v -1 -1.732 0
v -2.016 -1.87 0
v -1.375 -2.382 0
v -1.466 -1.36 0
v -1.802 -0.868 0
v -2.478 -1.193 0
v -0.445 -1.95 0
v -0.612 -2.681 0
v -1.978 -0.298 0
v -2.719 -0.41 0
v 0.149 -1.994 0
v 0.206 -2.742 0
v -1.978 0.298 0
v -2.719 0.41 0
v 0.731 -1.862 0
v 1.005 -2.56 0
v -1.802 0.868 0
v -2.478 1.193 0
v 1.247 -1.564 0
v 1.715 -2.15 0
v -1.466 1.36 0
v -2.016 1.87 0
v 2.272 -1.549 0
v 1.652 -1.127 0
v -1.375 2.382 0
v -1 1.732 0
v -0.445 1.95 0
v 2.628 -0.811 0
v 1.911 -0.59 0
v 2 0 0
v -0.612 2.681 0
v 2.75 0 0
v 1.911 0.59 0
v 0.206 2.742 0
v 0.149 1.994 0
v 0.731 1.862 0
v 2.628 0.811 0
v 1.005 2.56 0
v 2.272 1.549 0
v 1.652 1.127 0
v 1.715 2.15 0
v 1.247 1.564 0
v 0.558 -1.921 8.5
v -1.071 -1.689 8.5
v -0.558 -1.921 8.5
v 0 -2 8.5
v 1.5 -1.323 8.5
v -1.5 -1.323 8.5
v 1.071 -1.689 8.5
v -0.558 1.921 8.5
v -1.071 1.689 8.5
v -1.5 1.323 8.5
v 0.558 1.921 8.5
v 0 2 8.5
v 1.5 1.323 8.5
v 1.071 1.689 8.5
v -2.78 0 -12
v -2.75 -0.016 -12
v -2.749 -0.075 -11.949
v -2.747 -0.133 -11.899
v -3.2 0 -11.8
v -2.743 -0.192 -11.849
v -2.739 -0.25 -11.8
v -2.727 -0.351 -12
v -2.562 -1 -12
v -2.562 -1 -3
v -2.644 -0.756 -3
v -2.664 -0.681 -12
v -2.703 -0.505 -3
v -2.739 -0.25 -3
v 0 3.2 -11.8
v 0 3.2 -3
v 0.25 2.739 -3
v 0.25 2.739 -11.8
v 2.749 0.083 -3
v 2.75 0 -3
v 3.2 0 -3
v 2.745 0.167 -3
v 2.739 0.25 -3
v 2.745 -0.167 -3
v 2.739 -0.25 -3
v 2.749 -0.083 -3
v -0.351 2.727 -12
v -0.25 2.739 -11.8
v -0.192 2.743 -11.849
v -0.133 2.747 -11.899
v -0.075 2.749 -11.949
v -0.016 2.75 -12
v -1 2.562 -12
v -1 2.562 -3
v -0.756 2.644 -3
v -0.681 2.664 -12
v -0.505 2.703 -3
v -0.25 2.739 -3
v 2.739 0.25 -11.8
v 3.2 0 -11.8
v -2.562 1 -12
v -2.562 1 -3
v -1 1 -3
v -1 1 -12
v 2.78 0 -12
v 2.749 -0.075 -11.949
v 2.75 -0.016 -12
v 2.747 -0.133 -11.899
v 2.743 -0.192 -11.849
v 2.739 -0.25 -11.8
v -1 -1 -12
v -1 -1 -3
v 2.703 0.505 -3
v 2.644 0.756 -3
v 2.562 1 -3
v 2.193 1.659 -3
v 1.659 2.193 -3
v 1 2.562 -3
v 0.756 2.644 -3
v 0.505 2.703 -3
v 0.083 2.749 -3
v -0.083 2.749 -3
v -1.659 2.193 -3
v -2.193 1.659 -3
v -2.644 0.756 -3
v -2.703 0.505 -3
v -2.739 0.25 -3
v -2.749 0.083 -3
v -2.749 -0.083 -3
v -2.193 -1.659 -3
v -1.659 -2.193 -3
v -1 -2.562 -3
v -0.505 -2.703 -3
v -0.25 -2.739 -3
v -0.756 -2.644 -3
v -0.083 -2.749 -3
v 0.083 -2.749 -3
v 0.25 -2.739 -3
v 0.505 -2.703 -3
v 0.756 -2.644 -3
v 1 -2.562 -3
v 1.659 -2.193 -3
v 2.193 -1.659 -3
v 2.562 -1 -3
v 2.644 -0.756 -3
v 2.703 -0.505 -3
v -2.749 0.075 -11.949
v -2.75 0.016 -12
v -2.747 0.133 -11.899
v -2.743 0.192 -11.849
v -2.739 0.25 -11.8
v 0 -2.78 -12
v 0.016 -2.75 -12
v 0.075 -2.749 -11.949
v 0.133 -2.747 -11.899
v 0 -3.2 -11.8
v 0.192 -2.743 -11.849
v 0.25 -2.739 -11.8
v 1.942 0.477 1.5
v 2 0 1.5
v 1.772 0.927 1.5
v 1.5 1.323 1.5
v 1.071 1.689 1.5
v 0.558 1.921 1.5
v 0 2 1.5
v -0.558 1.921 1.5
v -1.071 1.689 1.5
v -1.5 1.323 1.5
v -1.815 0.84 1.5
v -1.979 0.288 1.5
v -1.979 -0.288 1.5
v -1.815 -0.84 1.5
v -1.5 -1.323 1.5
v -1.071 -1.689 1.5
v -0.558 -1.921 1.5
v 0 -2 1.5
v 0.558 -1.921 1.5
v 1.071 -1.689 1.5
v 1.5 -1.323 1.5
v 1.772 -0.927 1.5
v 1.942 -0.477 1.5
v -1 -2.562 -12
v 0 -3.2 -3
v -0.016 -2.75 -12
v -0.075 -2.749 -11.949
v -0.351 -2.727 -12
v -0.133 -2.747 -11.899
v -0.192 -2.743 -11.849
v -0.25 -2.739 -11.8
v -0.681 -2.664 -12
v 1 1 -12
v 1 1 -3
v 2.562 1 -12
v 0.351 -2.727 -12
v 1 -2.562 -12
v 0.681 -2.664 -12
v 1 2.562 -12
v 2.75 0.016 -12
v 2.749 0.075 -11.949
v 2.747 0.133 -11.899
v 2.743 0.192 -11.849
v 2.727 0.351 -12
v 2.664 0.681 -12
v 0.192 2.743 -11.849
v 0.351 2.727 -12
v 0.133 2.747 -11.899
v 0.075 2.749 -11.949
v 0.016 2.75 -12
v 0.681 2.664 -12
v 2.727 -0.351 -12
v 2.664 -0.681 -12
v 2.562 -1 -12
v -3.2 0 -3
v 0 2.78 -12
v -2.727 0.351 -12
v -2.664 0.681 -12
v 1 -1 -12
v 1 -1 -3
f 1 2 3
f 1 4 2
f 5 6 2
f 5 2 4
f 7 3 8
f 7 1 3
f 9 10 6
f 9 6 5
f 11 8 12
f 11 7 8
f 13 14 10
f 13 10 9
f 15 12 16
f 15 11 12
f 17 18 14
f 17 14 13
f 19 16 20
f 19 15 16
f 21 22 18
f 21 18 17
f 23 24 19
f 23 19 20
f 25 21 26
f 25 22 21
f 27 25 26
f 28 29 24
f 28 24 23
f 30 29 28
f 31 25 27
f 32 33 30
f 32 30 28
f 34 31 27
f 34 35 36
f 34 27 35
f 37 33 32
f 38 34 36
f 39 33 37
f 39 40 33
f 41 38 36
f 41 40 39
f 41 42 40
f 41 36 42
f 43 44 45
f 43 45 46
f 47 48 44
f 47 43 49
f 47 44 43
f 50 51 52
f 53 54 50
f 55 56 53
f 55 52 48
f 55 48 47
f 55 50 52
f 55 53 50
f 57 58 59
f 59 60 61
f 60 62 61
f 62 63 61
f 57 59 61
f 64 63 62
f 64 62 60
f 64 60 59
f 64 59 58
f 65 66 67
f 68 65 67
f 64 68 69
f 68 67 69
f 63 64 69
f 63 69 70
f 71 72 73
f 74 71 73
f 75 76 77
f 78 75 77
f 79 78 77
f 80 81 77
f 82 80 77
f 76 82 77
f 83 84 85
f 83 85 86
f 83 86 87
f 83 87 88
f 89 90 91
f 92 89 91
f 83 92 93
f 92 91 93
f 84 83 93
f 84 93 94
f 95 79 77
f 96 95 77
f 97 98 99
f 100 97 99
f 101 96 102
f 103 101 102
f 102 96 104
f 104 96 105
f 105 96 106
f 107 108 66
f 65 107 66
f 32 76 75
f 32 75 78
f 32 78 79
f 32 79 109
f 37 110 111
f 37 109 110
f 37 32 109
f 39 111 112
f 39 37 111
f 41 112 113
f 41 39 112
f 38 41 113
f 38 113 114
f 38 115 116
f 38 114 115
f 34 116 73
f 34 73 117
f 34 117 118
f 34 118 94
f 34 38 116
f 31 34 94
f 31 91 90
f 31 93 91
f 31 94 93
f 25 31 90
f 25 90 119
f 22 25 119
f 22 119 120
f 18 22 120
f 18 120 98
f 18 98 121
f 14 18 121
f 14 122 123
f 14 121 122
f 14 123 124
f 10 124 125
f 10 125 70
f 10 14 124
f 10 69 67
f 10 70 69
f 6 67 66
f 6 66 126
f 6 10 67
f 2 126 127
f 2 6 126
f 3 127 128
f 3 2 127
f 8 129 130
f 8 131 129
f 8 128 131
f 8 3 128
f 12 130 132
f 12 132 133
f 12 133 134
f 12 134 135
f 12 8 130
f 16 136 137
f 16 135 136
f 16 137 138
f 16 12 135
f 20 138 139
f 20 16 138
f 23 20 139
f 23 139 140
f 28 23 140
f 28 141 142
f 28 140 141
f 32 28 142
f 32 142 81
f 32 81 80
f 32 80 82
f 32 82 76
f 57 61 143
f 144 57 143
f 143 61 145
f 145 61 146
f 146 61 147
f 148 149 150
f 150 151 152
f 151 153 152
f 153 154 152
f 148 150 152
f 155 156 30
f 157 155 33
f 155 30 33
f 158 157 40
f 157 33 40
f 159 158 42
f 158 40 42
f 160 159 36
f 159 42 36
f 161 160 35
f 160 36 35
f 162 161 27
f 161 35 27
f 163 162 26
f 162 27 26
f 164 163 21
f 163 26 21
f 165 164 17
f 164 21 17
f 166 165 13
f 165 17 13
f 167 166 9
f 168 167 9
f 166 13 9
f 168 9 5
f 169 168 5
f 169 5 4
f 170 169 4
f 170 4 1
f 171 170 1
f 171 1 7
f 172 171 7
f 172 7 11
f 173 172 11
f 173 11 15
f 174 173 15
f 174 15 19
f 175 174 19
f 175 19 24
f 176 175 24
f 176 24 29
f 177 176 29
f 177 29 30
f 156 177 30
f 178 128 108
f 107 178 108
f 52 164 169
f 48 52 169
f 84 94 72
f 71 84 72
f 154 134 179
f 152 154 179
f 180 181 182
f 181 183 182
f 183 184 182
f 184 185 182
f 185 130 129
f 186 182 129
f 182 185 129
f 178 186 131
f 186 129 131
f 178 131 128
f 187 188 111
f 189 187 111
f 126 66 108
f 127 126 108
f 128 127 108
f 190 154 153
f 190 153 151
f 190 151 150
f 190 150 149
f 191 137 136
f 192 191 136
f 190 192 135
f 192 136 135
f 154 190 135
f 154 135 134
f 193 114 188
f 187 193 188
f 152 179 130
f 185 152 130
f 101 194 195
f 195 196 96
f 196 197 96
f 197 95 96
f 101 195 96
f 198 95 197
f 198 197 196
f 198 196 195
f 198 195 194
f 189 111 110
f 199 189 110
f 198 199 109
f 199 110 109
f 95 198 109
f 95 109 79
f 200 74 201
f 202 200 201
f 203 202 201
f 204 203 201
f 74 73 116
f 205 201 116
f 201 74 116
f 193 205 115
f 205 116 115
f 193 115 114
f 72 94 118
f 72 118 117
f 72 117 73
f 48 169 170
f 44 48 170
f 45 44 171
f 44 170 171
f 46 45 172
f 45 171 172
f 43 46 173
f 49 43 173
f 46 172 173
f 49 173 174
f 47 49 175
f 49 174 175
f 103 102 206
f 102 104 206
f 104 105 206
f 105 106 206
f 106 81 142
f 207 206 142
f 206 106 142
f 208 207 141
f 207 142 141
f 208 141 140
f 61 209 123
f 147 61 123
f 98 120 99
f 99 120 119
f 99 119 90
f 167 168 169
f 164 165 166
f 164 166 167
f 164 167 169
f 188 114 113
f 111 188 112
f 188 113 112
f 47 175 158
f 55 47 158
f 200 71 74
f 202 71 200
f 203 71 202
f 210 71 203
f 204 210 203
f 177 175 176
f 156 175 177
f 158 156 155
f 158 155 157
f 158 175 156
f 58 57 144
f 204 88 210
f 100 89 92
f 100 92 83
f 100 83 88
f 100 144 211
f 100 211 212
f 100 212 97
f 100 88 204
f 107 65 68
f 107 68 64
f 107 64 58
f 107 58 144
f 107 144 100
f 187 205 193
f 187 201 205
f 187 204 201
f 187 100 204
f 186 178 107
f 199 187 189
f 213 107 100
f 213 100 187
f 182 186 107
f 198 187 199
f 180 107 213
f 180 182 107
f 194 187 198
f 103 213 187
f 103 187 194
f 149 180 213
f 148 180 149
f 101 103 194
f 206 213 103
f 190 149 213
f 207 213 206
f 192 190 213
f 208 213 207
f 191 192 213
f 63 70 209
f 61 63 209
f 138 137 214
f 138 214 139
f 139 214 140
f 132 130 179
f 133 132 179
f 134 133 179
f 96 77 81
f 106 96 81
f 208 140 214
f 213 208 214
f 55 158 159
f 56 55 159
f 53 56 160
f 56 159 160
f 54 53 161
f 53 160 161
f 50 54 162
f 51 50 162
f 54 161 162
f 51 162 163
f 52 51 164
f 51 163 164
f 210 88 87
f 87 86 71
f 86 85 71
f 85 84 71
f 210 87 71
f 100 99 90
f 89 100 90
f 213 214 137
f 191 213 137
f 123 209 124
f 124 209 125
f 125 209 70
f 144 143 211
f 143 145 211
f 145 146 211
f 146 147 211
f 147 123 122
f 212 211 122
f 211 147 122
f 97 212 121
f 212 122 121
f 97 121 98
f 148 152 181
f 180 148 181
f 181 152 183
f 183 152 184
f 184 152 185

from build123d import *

# Parameters (mm, degrees)
F0_R     = 2.75
F0_R_2   = 2
F1_DEPTH = 3
F2_DEPTH = 1.5
F4_DEPTH = 7
F6_DEPTH = 9
F7_SIZE  = 0.2


# Not quite as in the source:
# - after a boolean that leaves OpenCascade's solid faulty, fix() repairs it


with BuildPart() as f1:
    # F0 (on Top) → F1 (new body)
    with BuildSketch(Plane.XY):
        Circle(F0_R)
        Circle(F0_R_2, mode=Mode.SUBTRACT)
        Circle(F0_R_2)
    extrude(amount=-F1_DEPTH)

    # F0 (on Top) → F2 (join)
    with BuildSketch(Plane.XY):
        Circle(F0_R_2)
    extrude(amount=F2_DEPTH)

    # F3 (on face) → F4 (join)
    with BuildSketch(Plane.XY.offset(1.5)):
        with BuildLine():
            ThreePointArc((1.5, 1.3228756555), (0, 2), (-1.5, 1.3228756555))
            Line((-1.5, 1.3228756555), (-1.5, -1.3228756555))
            ThreePointArc((-1.5, -1.3228756555), (0, -2), (1.5, -1.3228756555))
            Line((1.5, -1.3228756555), (1.5, 1.3228756555))
        make_face()
    extrude(amount=F4_DEPTH)

    # F5 (on face) → F6 (join)
    with BuildSketch(Plane(origin=(0, 0, -3), x_dir=(1, 0, 0), z_dir=(0, 0, -1))):
        with BuildLine():
            ThreePointArc((0.25, -2.7386127875), (0.63122595, -2.676575013), (1, -2.5617376915))
            Line((1, -2.5617376915), (1, -1))
            Line((1, -1), (2.5617376915, -1))
            ThreePointArc((2.5617376915, -1), (2.676575013, -0.63122595), (2.7386127875, -0.25))
            ThreePointArc((2.7386127875, -0.25), (2.7471517218, -0.1251296014), (2.75, 0))
            ThreePointArc((2.75, 0), (2.7471517218, 0.1251296014), (2.7386127875, 0.25))
            ThreePointArc((2.7386127875, 0.25), (2.676575013, 0.63122595), (2.5617376915, 1))
            Line((2.5617376915, 1), (1, 1))
            Line((1, 1), (1, 2.5617376915))
            ThreePointArc((1, 2.5617376915), (0.63122595, 2.676575013), (0.25, 2.7386127875))
            ThreePointArc((0.25, 2.7386127875), (0, 2.75), (-0.25, 2.7386127875))
            ThreePointArc((-0.25, 2.7386127875), (-0.63122595, 2.676575013), (-1, 2.5617376915))
            Line((-1, 2.5617376915), (-1, 1))
            Line((-1, 1), (-2.5617376915, 1))
            ThreePointArc((-2.5617376915, 1), (-2.676575013, 0.63122595), (-2.7386127875, 0.25))
            ThreePointArc((-2.7386127875, 0.25), (-2.75, 0), (-2.7386127875, -0.25))
            ThreePointArc((-2.7386127875, -0.25), (-2.676575013, -0.63122595), (-2.5617376915, -1))
            Line((-2.5617376915, -1), (-1, -1))
            Line((-1, -1), (-1, -2.5617376915))
            ThreePointArc((-1, -2.5617376915), (-0.63122595, -2.676575013), (-0.25, -2.7386127875))
            ThreePointArc((-0.25, -2.7386127875), (0, -2.75), (0.25, -2.7386127875))
        make_face()
        with BuildLine():
            ThreePointArc((2.75, 0), (2.7471517218, -0.1251296014), (2.7386127875, -0.25))
            Line((2.7386127875, -0.25), (3.2, 0))
            Line((3.2, 0), (2.7386127875, 0.25))
            ThreePointArc((2.7386127875, 0.25), (2.7471517218, 0.1251296014), (2.75, 0))
        make_face()
        with BuildLine():
            Line((0, -3.2), (0.25, -2.7386127875))
            ThreePointArc((0.25, -2.7386127875), (0, -2.75), (-0.25, -2.7386127875))
            Line((-0.25, -2.7386127875), (0, -3.2))
        make_face()
        with BuildLine():
            Line((-3.2, 0), (-2.7386127875, -0.25))
            ThreePointArc((-2.7386127875, -0.25), (-2.75, 0), (-2.7386127875, 0.25))
            Line((-2.7386127875, 0.25), (-3.2, 0))
        make_face()
        with BuildLine():
            ThreePointArc((-0.25, 2.7386127875), (0, 2.75), (0.25, 2.7386127875))
            Line((0.25, 2.7386127875), (0, 3.2))
            Line((0, 3.2), (-0.25, 2.7386127875))
        make_face()
    extrude(amount=F6_DEPTH)

    add(f1.part.fix(), mode=Mode.REPLACE)

    # F7
    f7_edges = [f1.edges().sort_by_distance(p)[0] for p in [
        (-0.125, 2.969306, -12),
        (0.125, 2.969306, -12),
        (-2.969306, 0.125, -12),
        (-2.969306, -0.125, -12),
        (0.125, -2.969306, -12),
        (-0.125, -2.969306, -12),
        (2.969306, -0.125, -12),
        (2.969306, 0.125, -12),
    ]]
    chamfer(f7_edges, length=F7_SIZE)


solid = f1.part
